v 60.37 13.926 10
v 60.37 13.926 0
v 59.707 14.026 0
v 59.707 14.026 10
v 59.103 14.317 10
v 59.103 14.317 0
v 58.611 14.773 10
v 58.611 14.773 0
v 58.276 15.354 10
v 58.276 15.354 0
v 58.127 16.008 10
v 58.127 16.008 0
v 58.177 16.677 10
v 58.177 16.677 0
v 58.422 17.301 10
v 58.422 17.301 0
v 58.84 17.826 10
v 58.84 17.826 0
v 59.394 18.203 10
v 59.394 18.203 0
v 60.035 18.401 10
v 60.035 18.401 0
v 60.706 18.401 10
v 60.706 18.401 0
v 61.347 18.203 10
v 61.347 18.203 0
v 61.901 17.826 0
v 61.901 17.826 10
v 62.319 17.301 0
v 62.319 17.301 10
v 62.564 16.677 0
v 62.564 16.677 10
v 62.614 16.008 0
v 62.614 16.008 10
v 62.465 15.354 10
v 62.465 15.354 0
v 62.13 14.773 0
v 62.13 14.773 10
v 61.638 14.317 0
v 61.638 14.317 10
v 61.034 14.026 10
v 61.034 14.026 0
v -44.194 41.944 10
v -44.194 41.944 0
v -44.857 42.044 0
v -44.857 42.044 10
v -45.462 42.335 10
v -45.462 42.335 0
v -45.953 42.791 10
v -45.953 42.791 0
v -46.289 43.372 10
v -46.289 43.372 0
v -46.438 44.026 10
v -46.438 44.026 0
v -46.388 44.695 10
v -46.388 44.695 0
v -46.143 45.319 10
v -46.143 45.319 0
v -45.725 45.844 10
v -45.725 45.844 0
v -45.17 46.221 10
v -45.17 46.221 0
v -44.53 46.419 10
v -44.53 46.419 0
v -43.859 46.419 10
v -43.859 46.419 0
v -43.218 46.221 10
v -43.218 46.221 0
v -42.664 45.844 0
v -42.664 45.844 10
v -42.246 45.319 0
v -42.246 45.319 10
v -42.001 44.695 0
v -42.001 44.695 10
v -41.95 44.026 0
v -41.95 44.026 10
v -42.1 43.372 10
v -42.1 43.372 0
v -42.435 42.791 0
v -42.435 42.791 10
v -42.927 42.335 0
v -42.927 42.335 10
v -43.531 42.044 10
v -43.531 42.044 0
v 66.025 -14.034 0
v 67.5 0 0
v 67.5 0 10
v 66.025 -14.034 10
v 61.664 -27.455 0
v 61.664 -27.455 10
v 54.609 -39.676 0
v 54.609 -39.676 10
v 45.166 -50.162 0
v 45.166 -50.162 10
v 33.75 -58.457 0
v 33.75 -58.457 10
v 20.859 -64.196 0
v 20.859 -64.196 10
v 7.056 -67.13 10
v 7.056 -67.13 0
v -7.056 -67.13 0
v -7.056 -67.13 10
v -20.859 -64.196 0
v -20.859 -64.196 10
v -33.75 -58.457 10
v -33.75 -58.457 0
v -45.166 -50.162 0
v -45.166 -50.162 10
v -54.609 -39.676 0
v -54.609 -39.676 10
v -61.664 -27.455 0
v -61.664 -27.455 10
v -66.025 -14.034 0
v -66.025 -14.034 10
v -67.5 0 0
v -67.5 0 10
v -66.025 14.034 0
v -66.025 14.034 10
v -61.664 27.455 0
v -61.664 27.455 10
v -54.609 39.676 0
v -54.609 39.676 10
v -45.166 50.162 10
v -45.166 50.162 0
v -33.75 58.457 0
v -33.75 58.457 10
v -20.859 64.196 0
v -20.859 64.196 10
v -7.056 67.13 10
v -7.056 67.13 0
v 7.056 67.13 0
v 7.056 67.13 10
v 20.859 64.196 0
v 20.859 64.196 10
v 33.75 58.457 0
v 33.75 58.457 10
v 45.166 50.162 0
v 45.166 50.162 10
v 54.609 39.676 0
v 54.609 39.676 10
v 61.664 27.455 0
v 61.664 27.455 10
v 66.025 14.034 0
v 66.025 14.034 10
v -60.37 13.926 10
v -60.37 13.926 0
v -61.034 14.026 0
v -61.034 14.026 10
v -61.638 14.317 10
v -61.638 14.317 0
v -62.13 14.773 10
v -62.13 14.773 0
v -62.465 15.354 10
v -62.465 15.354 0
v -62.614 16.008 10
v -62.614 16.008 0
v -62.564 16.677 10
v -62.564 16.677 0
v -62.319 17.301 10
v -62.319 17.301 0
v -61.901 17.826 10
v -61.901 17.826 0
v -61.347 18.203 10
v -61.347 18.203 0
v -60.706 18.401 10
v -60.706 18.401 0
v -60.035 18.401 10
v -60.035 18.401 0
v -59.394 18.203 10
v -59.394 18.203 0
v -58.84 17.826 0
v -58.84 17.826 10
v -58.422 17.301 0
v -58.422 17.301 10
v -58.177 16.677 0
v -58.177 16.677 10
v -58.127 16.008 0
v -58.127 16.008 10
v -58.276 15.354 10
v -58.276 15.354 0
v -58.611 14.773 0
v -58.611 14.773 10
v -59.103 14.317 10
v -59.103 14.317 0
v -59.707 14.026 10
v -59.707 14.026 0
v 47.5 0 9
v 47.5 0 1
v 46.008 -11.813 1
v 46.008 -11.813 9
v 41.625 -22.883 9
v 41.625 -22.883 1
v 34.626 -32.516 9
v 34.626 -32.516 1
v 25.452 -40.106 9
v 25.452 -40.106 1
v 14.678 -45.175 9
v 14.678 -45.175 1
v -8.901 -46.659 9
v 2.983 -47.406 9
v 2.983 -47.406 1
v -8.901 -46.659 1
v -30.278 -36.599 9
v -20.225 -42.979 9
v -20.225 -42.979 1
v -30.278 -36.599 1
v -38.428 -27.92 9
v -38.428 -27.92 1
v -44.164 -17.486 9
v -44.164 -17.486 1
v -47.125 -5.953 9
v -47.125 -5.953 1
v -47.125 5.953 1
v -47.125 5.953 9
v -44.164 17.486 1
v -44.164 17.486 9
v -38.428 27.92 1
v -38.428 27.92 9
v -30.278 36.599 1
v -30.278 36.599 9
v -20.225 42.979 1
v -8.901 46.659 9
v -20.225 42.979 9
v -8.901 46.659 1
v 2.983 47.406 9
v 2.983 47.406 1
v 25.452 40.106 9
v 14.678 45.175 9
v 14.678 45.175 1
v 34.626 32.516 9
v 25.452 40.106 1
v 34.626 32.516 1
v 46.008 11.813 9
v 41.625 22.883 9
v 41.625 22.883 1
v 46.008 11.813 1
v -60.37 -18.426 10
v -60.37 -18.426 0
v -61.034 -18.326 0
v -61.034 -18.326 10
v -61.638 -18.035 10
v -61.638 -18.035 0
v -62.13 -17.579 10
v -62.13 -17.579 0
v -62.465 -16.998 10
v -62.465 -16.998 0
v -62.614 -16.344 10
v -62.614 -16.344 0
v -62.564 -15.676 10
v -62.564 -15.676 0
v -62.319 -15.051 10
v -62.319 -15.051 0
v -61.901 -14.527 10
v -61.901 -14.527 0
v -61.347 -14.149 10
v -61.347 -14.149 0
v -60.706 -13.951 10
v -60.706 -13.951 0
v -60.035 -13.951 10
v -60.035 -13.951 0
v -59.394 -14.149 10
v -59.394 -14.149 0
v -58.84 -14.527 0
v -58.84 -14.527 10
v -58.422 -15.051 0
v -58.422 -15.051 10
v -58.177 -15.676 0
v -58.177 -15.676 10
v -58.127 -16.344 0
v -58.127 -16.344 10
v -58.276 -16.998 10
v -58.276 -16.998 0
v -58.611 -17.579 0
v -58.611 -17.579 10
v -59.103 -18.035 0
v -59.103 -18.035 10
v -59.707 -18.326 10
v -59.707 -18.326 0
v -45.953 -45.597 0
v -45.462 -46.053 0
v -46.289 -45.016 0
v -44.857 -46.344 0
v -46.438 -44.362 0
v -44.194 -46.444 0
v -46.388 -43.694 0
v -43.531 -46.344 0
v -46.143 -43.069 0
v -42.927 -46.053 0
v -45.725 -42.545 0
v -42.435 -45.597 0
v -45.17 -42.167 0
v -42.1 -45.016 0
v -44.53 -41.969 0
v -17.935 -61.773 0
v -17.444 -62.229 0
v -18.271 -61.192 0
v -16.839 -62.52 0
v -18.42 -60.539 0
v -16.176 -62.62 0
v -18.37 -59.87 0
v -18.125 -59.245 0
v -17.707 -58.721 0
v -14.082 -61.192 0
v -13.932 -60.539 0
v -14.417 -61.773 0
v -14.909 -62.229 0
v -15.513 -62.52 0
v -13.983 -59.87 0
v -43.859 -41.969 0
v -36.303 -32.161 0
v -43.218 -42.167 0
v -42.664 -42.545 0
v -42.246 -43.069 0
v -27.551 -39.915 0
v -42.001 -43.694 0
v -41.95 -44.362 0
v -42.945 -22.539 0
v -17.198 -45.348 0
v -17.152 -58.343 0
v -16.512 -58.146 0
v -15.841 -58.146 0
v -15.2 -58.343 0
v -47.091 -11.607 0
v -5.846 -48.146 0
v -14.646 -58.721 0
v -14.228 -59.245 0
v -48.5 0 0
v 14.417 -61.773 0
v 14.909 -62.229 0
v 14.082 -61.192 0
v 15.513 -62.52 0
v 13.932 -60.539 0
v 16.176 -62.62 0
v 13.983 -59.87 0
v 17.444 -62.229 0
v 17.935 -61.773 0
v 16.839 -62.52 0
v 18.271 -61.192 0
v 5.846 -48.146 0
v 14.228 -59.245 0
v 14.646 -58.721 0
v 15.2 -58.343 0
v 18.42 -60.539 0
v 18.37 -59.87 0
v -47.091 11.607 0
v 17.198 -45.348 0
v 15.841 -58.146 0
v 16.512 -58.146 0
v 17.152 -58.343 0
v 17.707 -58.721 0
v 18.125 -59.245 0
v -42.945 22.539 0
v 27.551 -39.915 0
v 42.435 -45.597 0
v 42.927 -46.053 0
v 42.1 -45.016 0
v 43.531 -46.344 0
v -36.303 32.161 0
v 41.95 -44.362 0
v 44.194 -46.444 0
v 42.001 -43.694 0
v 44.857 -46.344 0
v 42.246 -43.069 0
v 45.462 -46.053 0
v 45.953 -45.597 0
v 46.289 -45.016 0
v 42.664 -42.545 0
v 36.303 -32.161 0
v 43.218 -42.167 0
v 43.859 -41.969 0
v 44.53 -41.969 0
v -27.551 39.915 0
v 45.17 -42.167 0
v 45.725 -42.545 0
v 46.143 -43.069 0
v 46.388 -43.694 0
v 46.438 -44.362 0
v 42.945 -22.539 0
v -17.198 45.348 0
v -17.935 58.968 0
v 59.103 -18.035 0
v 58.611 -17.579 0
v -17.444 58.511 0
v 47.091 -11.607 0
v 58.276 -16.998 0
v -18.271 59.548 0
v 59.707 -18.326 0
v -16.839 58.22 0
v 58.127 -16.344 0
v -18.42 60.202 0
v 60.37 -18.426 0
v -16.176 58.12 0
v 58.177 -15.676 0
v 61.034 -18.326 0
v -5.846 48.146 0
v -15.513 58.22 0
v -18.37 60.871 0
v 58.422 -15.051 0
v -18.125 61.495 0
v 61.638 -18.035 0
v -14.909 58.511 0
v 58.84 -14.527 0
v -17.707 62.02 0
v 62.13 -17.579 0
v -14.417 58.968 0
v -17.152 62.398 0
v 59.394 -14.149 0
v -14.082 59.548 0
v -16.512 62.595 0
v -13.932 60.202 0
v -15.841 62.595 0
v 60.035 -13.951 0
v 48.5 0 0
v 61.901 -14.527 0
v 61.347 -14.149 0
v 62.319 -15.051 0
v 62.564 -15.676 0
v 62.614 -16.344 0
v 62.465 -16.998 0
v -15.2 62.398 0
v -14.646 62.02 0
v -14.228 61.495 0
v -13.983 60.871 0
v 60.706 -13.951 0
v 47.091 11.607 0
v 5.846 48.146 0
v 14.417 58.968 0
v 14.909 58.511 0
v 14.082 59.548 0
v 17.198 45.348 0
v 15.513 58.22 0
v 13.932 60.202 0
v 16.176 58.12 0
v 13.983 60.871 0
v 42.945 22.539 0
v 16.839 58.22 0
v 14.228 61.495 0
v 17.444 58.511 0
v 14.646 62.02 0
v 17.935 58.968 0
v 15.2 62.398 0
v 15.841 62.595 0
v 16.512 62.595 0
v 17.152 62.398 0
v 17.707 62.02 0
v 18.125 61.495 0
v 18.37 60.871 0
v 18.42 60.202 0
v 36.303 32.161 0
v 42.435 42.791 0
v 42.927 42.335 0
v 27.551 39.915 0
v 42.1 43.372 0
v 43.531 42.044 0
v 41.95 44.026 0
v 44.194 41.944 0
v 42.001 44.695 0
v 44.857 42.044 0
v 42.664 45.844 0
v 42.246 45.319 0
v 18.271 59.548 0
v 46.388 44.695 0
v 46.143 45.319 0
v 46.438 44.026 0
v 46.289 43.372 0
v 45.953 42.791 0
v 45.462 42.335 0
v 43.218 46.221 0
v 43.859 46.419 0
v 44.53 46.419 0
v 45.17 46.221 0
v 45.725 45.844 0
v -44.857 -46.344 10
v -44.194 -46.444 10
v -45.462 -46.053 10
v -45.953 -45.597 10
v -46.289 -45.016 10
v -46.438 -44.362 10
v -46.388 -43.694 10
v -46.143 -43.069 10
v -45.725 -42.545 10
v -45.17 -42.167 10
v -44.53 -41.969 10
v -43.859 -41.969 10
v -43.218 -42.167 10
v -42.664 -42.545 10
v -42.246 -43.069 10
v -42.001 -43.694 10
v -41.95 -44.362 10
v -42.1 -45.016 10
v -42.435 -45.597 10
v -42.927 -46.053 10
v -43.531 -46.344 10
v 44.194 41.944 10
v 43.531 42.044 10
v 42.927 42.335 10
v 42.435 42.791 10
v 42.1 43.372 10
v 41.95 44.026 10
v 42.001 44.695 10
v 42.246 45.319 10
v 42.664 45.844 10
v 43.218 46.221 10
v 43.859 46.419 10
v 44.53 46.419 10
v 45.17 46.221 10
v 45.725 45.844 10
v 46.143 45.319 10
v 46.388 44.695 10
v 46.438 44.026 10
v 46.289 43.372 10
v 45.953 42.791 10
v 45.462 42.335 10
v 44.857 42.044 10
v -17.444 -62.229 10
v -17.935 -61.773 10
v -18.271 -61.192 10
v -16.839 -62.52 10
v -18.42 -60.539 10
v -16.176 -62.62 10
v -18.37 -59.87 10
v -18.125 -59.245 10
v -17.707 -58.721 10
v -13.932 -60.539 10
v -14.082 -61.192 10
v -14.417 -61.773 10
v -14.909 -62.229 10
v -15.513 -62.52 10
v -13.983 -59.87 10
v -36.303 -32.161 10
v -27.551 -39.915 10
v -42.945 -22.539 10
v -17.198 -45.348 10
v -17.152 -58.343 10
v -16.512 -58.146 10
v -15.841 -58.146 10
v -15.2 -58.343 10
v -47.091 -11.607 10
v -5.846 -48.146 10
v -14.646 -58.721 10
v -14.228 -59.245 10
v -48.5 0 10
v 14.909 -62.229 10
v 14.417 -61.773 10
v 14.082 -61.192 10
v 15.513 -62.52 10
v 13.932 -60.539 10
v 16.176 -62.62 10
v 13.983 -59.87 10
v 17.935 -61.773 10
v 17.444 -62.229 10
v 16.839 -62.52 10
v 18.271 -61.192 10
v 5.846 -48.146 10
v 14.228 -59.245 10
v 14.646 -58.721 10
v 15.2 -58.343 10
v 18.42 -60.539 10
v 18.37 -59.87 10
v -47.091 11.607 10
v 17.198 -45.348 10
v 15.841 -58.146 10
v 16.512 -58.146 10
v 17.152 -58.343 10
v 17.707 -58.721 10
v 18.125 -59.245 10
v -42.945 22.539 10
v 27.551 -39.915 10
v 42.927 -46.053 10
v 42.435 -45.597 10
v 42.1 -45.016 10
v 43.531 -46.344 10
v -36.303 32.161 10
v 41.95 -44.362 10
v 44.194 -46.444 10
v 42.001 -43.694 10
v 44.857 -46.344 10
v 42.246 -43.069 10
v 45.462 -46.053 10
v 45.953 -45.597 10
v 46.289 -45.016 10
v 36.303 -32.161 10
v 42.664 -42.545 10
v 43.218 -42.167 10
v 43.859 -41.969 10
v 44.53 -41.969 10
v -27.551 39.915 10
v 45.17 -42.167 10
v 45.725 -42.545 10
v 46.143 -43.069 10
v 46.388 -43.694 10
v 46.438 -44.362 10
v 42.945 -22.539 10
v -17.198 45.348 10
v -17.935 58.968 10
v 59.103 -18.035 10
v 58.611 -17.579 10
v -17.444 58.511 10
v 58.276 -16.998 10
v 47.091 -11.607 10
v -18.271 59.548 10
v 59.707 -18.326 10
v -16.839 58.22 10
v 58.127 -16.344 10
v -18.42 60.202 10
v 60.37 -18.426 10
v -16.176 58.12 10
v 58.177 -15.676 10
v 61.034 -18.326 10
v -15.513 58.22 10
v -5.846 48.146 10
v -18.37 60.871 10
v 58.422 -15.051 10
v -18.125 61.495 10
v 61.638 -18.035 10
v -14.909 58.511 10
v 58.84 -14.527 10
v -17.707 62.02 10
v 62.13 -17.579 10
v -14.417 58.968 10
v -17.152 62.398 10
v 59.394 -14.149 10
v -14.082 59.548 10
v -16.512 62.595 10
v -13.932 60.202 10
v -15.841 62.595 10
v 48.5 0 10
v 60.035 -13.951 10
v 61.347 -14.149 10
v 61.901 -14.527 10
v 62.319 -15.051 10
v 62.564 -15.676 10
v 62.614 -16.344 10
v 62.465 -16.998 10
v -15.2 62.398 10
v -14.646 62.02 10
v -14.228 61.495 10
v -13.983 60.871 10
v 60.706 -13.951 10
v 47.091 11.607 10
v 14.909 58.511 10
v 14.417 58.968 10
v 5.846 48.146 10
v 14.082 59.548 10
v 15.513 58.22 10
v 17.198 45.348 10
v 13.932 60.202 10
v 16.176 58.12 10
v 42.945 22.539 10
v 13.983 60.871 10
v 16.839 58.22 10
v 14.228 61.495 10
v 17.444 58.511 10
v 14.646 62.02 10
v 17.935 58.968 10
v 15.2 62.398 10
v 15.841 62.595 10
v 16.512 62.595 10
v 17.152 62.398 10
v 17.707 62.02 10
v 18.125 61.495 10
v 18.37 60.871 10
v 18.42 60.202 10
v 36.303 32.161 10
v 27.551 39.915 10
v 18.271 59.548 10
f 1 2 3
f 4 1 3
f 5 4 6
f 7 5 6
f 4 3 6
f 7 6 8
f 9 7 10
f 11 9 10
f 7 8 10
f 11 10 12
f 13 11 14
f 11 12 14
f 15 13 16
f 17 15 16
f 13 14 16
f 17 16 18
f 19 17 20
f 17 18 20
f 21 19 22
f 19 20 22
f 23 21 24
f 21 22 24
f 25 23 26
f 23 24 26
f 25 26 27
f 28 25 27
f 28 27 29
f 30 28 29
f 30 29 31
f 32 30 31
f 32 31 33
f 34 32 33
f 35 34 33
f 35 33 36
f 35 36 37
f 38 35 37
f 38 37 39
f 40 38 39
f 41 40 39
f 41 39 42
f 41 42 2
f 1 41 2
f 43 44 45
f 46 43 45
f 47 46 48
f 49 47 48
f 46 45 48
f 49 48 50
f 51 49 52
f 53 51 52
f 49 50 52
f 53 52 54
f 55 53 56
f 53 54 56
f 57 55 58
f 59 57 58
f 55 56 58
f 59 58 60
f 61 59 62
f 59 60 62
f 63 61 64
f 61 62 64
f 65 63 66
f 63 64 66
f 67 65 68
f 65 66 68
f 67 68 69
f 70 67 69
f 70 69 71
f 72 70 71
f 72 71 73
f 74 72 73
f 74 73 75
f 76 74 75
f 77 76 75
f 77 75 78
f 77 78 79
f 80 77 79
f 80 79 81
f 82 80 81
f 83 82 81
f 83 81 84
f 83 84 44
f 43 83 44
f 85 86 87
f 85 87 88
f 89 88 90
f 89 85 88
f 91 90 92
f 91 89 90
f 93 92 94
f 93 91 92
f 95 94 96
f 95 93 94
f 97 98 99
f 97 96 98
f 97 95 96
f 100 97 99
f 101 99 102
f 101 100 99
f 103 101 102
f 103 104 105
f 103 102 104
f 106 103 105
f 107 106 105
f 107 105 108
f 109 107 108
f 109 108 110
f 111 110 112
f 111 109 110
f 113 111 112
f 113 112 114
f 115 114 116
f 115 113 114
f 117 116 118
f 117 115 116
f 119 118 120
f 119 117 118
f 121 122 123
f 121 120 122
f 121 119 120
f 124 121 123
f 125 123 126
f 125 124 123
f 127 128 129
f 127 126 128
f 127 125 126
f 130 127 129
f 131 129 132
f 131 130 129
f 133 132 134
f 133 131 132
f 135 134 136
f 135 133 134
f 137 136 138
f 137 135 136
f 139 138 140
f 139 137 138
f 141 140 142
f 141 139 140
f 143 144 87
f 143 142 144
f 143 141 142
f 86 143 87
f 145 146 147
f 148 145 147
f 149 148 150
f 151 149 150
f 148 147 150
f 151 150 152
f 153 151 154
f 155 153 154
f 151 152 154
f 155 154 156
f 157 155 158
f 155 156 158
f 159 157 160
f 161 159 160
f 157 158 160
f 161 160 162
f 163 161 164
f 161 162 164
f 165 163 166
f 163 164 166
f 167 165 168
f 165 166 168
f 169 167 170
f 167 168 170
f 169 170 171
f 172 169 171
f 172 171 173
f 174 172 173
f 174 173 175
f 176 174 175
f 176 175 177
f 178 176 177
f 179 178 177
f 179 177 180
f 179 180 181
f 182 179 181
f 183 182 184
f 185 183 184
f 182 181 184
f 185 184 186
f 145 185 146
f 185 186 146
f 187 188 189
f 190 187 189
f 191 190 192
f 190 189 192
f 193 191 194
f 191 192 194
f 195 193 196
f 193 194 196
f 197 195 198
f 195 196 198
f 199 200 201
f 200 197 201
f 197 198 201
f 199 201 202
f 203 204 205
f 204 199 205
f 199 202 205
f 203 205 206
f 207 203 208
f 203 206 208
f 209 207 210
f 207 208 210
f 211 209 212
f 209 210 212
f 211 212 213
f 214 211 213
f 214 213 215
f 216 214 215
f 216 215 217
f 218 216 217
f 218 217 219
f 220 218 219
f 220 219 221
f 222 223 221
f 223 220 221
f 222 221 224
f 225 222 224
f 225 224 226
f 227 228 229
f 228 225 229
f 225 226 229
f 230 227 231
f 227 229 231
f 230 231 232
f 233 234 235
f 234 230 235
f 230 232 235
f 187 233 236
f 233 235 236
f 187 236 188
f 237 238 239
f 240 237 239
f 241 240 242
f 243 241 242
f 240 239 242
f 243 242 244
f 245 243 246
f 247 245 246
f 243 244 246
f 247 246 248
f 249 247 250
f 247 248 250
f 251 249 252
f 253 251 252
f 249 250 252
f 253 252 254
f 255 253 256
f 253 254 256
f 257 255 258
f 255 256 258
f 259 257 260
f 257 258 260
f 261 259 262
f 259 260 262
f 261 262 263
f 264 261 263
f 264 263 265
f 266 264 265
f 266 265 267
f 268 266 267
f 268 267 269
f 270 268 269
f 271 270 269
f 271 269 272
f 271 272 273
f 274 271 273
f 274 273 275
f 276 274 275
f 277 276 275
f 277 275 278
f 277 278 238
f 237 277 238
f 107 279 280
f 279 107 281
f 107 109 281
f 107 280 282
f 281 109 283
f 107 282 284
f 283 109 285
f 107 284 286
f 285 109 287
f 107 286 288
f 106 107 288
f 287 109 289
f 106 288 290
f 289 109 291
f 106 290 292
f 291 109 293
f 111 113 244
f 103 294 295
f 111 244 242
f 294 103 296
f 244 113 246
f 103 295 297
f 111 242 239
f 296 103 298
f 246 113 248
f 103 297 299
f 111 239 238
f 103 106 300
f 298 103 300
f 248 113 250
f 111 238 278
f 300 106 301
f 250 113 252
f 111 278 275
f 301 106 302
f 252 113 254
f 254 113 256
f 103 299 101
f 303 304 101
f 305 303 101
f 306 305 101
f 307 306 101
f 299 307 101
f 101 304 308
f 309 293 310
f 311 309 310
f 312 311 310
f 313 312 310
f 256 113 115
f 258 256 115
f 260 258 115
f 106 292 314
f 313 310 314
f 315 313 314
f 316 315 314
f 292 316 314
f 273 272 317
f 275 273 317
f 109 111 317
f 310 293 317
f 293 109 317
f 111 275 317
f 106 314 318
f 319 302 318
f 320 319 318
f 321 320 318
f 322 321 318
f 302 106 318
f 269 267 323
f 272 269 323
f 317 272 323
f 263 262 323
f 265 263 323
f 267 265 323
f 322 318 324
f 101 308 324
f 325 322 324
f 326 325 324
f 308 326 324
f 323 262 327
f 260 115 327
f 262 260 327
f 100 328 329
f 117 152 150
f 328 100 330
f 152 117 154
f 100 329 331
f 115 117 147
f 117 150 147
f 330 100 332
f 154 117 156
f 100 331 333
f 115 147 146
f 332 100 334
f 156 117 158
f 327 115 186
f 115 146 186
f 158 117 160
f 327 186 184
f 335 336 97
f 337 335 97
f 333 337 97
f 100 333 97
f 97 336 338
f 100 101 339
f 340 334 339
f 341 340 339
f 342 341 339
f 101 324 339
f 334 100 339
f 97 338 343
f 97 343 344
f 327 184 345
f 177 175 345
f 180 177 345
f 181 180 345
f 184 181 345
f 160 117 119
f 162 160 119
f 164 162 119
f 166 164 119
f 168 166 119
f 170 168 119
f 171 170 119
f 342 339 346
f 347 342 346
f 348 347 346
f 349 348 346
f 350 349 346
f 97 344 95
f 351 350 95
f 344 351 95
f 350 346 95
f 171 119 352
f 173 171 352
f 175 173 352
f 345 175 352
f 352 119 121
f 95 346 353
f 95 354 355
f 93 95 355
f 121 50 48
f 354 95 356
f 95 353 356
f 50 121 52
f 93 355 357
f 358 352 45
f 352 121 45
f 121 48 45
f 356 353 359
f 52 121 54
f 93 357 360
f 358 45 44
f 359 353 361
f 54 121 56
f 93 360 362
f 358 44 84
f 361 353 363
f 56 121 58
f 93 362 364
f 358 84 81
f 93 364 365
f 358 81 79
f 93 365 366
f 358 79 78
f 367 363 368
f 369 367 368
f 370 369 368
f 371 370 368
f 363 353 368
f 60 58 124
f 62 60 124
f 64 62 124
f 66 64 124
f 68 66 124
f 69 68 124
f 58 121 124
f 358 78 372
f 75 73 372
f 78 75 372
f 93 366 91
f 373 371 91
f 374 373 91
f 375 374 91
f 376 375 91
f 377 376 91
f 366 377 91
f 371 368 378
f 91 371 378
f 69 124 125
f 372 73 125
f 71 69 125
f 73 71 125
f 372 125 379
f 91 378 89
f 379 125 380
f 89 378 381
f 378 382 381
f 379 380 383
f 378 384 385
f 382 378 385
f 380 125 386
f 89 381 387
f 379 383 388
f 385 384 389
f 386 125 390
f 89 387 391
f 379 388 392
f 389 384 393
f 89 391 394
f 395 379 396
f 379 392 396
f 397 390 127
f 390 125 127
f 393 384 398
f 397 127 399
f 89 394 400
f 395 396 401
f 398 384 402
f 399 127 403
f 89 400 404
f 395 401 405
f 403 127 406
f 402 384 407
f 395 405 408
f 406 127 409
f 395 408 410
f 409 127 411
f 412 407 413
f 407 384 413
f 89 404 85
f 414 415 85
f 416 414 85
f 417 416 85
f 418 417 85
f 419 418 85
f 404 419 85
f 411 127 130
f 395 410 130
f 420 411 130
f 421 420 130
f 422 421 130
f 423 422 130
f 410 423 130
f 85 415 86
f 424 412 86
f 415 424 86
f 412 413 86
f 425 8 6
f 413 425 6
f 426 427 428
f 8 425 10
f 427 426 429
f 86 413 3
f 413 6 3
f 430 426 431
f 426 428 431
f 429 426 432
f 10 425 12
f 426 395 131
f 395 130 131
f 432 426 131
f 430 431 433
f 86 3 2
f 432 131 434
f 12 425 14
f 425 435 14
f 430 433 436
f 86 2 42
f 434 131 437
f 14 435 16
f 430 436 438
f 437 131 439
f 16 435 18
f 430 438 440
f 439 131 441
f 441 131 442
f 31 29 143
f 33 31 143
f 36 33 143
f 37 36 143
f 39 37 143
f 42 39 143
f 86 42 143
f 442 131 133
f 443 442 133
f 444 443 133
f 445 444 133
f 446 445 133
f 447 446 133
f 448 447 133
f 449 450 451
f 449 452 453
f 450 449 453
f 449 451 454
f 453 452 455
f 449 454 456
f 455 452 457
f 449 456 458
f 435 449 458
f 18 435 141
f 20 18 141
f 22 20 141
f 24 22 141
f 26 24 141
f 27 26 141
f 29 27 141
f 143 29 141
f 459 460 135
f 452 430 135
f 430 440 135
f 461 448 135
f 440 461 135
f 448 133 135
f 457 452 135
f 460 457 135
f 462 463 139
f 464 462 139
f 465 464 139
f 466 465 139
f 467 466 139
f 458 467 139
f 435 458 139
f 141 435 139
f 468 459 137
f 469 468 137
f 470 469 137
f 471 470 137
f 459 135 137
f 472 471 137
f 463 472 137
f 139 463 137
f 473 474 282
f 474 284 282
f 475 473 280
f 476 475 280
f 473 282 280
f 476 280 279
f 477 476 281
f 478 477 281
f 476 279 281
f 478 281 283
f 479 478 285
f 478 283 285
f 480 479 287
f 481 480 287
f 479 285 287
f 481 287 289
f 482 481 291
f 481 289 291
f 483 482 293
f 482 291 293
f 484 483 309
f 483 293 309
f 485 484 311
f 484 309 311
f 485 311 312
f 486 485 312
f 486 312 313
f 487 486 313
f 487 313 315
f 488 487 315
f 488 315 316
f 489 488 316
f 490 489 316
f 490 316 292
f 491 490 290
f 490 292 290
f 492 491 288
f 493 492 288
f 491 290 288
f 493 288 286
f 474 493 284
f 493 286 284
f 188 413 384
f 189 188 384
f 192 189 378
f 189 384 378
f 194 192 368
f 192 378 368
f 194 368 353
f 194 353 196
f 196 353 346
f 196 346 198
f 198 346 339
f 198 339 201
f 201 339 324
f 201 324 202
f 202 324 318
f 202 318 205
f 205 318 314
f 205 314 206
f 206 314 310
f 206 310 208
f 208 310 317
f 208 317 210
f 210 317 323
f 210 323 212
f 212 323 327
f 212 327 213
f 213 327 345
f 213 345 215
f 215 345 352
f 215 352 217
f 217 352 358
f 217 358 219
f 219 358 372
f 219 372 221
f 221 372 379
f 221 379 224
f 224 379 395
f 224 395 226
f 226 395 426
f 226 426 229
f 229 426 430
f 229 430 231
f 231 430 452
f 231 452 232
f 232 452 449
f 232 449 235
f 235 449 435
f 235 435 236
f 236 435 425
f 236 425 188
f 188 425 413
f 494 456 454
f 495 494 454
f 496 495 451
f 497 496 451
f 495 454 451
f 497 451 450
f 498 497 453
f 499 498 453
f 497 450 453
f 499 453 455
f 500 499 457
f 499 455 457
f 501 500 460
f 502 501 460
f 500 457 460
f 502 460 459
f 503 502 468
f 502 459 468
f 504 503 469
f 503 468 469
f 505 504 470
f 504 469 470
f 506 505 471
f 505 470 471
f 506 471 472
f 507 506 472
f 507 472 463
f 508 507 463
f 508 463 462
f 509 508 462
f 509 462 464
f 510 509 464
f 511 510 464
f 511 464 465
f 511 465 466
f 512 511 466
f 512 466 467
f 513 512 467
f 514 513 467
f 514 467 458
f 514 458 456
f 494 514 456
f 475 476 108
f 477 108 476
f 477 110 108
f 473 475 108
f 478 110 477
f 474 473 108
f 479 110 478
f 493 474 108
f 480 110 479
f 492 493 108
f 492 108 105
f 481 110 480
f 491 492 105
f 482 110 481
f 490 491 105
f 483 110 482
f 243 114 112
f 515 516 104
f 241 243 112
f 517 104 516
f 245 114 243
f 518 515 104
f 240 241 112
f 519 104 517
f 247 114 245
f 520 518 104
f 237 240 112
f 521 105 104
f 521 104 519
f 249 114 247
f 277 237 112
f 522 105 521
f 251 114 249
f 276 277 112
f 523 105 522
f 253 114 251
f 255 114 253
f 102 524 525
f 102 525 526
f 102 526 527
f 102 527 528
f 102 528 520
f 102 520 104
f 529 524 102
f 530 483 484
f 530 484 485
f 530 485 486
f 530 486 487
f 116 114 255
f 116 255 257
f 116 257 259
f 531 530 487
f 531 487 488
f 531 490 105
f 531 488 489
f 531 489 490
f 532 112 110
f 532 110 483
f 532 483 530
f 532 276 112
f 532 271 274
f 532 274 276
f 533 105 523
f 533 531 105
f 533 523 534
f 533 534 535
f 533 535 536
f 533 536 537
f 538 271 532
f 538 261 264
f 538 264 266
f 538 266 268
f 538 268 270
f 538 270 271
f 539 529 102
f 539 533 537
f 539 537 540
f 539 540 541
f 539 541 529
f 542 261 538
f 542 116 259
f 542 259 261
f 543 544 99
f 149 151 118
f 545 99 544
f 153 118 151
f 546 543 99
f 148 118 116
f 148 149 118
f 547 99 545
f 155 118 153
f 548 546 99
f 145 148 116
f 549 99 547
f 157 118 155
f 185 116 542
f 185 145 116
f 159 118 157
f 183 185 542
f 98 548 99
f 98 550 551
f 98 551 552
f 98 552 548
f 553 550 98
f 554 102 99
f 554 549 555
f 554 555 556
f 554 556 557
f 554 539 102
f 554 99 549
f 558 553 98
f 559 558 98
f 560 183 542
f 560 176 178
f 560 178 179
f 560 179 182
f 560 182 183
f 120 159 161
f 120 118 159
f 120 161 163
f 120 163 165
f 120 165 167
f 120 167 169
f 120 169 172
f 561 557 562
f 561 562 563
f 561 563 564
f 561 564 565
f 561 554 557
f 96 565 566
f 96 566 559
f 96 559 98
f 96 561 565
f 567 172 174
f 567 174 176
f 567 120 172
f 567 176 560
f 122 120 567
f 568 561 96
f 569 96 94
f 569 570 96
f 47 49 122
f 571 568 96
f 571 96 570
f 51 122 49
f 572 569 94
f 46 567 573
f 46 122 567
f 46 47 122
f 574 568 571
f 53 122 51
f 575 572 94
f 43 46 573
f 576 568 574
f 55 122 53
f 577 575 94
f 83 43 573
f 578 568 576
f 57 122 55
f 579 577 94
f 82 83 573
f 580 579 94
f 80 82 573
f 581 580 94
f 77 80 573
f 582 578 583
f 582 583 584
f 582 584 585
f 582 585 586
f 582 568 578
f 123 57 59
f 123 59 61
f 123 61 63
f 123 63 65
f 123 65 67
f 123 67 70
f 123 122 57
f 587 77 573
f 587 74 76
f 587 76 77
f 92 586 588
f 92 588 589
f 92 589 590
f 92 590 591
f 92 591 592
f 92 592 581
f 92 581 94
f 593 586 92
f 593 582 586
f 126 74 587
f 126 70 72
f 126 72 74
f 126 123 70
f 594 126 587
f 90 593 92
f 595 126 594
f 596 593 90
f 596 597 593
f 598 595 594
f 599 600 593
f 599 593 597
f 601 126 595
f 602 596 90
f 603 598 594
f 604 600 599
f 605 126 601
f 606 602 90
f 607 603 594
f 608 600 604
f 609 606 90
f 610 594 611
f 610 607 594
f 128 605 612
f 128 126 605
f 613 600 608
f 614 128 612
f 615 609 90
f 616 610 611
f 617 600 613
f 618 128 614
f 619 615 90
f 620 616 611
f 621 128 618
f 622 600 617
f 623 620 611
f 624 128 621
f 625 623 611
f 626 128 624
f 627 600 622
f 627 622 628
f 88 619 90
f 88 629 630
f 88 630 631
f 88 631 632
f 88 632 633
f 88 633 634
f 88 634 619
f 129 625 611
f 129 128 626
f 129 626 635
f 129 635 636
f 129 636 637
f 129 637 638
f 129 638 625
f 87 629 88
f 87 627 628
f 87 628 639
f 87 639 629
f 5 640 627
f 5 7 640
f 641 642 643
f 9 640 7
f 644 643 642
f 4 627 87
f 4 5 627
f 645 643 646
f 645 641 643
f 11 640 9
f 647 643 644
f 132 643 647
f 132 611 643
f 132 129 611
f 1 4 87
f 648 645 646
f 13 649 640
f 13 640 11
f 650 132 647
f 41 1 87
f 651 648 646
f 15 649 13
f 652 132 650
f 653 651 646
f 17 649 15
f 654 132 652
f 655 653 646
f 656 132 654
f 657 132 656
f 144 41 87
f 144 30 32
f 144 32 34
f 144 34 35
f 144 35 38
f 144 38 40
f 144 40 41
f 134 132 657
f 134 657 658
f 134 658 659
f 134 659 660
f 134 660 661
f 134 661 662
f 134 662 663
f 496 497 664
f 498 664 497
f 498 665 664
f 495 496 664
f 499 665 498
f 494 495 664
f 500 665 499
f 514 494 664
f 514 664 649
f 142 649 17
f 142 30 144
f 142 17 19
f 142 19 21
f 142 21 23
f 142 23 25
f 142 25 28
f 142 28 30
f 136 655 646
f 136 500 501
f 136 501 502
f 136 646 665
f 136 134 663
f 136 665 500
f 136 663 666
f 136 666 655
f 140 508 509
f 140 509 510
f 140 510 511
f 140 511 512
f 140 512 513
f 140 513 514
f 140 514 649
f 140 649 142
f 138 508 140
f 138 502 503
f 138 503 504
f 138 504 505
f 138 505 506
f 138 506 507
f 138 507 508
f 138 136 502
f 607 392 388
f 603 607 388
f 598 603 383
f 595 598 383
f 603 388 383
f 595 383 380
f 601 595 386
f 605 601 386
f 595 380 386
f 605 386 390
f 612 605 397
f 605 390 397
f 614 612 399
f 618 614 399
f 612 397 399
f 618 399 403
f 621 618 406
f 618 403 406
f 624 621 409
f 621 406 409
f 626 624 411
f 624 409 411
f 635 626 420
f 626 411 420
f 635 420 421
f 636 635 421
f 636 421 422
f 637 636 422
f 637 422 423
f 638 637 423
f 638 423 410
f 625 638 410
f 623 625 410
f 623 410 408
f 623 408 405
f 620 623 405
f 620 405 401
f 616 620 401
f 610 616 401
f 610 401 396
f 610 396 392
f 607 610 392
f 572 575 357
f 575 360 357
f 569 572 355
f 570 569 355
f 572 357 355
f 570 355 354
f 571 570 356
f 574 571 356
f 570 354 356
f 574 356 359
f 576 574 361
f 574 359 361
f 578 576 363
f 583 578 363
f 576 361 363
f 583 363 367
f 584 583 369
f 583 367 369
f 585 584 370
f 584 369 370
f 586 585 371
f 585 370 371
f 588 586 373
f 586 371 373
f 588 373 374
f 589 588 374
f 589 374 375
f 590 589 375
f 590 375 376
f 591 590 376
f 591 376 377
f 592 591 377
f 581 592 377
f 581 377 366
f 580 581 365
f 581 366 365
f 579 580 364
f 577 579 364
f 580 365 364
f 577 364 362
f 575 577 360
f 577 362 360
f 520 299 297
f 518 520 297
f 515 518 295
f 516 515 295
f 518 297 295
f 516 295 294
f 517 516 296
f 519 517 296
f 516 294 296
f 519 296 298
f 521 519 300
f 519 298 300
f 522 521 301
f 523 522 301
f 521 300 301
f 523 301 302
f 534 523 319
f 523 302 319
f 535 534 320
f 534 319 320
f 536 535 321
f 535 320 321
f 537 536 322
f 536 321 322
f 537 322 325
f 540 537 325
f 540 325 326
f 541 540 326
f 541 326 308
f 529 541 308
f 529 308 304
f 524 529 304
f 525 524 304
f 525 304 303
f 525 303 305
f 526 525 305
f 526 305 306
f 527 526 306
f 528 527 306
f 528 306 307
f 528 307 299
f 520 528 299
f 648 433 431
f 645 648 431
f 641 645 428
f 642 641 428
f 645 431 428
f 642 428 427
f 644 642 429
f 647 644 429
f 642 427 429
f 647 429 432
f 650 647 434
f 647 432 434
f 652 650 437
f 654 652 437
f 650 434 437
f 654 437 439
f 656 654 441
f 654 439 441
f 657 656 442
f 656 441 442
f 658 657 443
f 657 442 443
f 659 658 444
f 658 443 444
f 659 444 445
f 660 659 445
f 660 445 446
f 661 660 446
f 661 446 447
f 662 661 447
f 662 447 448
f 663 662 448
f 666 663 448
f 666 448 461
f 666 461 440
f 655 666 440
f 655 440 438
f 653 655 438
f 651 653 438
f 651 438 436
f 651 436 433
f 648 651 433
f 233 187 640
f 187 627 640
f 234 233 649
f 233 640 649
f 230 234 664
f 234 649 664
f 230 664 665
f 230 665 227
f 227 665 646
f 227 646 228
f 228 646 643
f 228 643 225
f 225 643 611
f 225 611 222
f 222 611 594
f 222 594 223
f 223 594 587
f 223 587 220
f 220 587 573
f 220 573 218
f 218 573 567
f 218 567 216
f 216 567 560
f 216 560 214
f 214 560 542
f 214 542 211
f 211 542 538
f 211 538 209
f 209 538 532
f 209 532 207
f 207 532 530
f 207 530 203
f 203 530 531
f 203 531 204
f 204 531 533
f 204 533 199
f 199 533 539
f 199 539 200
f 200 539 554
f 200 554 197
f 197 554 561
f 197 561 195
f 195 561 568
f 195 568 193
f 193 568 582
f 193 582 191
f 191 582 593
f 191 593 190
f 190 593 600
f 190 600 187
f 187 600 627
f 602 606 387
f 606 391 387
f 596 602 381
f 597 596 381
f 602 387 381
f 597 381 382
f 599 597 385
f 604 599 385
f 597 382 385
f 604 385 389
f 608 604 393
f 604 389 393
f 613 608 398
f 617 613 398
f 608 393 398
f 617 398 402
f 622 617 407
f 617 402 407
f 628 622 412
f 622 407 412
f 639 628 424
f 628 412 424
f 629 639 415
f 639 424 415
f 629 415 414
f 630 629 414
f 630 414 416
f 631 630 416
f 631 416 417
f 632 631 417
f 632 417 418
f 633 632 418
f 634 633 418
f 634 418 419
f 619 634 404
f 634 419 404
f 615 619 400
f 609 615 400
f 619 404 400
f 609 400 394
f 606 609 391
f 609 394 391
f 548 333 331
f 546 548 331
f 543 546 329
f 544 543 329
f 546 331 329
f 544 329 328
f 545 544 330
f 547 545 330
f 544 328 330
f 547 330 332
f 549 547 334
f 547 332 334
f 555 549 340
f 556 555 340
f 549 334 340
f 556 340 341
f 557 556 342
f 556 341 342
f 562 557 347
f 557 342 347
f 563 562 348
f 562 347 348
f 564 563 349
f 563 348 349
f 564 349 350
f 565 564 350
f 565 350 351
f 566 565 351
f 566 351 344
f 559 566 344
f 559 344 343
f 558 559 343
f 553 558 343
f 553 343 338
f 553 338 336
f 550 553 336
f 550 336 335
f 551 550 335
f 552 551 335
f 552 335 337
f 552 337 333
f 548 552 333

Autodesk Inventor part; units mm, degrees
ref_plane "YZ Plane" through (0, 0, 0) normal (1, 0, 0) x (0, 1, 0)
ref_plane "XZ Plane" through (0, 0, 0) normal (0, 1, 0) x (-1, 0, 0)
ref_plane "XY Plane" through (0, 0, 0) normal (0, 0, 1) x (1, 0, 0)
sketch "スケッチ1" plane through (0, 0, 0) normal (0, 0, 1) x (1, 0, 0)
  circle A0 centre (0, 0) radius 47.5
  circle A1 centre (0, 0) radius 67.5
  dimension "d0" = 95
  dimension "d1" = 135
extrude "押し出し1" add sketch "スケッチ1" along normal blind 10
sketch "スケッチ2" plane through (0, 0, 10) normal (0, 0, 1) x (1, 0, 0)
  circle A0 centre (0, 0) radius 62.5
  point P0 (16.1762, 60.3704)
  point P1 (-16.1762, 60.3704)
  point P2 (-44.1942, 44.1942)
  point P3 (-60.3704, 16.1762)
  point P4 (-60.3704, -16.1762)
  point P5 (-44.1942, -44.1942)
  point P6 (-16.1762, -60.3704)
  point P7 (16.1762, -60.3704)
  point P8 (44.1942, -44.1942)
  point P9 (60.3704, -16.1762)
  point P10 (60.3704, 16.1762)
  point P11 (44.1942, 44.1942)
  dimension "d4" = 125
  dimension "d7" = 360
  dimension "d25" = 0
hole "穴1" at (16.1762, 60.3704, 10) at (-16.1762, 60.3704, 10) at (-44.1942, 44.1942, 10) at (-60.3704, 16.1762, 10) at (-60.3704, -16.1762, 10) at (-44.1942, -44.1942, 10) at (-16.1762, -60.3704, 10) at (16.1762, -60.3704, 10) at (44.1942, -44.1942, 10) at (60.3704, -16.1762, 10) at (60.3704, 16.1762, 10) at (44.1942, 44.1942, 10) direction (0, 0, -1) diameter 4.5 end through all clearance for "Flat Head Machine Screw" size "M4" standard "Ansi Metric M Profile"
chamfer "面取り1" distance 1 angle 45 2 edges at (-47.5, 0, 10) (-47.5, 0, 0)
sketch "スケッチ3" plane through (0, 0, 10) normal (0, 0, 1) x (1, 0, 0)
  circle A0 centre (16.1762, 60.3704) radius 2.25 projected
  circle A1 centre (-16.1762, 60.3704) radius 2.25 projected
  circle A2 centre (0, 0) radius 67.5 projected
  circle A3 centre (0, 0) radius 62.5
  circle A4 centre (-16.1762, 60.3704) radius 5
  circle A5 centre (16.1762, 60.3704) radius 5
  point P0 (11.2987, 61.4702)
  point P1 (17.4703, 65.2)
  point P2 (-17.4703, 65.2)
  point P3 (-20.9502, 58.8841)
properties part number "unit-j2-base2" material "ABS プラスチック"
